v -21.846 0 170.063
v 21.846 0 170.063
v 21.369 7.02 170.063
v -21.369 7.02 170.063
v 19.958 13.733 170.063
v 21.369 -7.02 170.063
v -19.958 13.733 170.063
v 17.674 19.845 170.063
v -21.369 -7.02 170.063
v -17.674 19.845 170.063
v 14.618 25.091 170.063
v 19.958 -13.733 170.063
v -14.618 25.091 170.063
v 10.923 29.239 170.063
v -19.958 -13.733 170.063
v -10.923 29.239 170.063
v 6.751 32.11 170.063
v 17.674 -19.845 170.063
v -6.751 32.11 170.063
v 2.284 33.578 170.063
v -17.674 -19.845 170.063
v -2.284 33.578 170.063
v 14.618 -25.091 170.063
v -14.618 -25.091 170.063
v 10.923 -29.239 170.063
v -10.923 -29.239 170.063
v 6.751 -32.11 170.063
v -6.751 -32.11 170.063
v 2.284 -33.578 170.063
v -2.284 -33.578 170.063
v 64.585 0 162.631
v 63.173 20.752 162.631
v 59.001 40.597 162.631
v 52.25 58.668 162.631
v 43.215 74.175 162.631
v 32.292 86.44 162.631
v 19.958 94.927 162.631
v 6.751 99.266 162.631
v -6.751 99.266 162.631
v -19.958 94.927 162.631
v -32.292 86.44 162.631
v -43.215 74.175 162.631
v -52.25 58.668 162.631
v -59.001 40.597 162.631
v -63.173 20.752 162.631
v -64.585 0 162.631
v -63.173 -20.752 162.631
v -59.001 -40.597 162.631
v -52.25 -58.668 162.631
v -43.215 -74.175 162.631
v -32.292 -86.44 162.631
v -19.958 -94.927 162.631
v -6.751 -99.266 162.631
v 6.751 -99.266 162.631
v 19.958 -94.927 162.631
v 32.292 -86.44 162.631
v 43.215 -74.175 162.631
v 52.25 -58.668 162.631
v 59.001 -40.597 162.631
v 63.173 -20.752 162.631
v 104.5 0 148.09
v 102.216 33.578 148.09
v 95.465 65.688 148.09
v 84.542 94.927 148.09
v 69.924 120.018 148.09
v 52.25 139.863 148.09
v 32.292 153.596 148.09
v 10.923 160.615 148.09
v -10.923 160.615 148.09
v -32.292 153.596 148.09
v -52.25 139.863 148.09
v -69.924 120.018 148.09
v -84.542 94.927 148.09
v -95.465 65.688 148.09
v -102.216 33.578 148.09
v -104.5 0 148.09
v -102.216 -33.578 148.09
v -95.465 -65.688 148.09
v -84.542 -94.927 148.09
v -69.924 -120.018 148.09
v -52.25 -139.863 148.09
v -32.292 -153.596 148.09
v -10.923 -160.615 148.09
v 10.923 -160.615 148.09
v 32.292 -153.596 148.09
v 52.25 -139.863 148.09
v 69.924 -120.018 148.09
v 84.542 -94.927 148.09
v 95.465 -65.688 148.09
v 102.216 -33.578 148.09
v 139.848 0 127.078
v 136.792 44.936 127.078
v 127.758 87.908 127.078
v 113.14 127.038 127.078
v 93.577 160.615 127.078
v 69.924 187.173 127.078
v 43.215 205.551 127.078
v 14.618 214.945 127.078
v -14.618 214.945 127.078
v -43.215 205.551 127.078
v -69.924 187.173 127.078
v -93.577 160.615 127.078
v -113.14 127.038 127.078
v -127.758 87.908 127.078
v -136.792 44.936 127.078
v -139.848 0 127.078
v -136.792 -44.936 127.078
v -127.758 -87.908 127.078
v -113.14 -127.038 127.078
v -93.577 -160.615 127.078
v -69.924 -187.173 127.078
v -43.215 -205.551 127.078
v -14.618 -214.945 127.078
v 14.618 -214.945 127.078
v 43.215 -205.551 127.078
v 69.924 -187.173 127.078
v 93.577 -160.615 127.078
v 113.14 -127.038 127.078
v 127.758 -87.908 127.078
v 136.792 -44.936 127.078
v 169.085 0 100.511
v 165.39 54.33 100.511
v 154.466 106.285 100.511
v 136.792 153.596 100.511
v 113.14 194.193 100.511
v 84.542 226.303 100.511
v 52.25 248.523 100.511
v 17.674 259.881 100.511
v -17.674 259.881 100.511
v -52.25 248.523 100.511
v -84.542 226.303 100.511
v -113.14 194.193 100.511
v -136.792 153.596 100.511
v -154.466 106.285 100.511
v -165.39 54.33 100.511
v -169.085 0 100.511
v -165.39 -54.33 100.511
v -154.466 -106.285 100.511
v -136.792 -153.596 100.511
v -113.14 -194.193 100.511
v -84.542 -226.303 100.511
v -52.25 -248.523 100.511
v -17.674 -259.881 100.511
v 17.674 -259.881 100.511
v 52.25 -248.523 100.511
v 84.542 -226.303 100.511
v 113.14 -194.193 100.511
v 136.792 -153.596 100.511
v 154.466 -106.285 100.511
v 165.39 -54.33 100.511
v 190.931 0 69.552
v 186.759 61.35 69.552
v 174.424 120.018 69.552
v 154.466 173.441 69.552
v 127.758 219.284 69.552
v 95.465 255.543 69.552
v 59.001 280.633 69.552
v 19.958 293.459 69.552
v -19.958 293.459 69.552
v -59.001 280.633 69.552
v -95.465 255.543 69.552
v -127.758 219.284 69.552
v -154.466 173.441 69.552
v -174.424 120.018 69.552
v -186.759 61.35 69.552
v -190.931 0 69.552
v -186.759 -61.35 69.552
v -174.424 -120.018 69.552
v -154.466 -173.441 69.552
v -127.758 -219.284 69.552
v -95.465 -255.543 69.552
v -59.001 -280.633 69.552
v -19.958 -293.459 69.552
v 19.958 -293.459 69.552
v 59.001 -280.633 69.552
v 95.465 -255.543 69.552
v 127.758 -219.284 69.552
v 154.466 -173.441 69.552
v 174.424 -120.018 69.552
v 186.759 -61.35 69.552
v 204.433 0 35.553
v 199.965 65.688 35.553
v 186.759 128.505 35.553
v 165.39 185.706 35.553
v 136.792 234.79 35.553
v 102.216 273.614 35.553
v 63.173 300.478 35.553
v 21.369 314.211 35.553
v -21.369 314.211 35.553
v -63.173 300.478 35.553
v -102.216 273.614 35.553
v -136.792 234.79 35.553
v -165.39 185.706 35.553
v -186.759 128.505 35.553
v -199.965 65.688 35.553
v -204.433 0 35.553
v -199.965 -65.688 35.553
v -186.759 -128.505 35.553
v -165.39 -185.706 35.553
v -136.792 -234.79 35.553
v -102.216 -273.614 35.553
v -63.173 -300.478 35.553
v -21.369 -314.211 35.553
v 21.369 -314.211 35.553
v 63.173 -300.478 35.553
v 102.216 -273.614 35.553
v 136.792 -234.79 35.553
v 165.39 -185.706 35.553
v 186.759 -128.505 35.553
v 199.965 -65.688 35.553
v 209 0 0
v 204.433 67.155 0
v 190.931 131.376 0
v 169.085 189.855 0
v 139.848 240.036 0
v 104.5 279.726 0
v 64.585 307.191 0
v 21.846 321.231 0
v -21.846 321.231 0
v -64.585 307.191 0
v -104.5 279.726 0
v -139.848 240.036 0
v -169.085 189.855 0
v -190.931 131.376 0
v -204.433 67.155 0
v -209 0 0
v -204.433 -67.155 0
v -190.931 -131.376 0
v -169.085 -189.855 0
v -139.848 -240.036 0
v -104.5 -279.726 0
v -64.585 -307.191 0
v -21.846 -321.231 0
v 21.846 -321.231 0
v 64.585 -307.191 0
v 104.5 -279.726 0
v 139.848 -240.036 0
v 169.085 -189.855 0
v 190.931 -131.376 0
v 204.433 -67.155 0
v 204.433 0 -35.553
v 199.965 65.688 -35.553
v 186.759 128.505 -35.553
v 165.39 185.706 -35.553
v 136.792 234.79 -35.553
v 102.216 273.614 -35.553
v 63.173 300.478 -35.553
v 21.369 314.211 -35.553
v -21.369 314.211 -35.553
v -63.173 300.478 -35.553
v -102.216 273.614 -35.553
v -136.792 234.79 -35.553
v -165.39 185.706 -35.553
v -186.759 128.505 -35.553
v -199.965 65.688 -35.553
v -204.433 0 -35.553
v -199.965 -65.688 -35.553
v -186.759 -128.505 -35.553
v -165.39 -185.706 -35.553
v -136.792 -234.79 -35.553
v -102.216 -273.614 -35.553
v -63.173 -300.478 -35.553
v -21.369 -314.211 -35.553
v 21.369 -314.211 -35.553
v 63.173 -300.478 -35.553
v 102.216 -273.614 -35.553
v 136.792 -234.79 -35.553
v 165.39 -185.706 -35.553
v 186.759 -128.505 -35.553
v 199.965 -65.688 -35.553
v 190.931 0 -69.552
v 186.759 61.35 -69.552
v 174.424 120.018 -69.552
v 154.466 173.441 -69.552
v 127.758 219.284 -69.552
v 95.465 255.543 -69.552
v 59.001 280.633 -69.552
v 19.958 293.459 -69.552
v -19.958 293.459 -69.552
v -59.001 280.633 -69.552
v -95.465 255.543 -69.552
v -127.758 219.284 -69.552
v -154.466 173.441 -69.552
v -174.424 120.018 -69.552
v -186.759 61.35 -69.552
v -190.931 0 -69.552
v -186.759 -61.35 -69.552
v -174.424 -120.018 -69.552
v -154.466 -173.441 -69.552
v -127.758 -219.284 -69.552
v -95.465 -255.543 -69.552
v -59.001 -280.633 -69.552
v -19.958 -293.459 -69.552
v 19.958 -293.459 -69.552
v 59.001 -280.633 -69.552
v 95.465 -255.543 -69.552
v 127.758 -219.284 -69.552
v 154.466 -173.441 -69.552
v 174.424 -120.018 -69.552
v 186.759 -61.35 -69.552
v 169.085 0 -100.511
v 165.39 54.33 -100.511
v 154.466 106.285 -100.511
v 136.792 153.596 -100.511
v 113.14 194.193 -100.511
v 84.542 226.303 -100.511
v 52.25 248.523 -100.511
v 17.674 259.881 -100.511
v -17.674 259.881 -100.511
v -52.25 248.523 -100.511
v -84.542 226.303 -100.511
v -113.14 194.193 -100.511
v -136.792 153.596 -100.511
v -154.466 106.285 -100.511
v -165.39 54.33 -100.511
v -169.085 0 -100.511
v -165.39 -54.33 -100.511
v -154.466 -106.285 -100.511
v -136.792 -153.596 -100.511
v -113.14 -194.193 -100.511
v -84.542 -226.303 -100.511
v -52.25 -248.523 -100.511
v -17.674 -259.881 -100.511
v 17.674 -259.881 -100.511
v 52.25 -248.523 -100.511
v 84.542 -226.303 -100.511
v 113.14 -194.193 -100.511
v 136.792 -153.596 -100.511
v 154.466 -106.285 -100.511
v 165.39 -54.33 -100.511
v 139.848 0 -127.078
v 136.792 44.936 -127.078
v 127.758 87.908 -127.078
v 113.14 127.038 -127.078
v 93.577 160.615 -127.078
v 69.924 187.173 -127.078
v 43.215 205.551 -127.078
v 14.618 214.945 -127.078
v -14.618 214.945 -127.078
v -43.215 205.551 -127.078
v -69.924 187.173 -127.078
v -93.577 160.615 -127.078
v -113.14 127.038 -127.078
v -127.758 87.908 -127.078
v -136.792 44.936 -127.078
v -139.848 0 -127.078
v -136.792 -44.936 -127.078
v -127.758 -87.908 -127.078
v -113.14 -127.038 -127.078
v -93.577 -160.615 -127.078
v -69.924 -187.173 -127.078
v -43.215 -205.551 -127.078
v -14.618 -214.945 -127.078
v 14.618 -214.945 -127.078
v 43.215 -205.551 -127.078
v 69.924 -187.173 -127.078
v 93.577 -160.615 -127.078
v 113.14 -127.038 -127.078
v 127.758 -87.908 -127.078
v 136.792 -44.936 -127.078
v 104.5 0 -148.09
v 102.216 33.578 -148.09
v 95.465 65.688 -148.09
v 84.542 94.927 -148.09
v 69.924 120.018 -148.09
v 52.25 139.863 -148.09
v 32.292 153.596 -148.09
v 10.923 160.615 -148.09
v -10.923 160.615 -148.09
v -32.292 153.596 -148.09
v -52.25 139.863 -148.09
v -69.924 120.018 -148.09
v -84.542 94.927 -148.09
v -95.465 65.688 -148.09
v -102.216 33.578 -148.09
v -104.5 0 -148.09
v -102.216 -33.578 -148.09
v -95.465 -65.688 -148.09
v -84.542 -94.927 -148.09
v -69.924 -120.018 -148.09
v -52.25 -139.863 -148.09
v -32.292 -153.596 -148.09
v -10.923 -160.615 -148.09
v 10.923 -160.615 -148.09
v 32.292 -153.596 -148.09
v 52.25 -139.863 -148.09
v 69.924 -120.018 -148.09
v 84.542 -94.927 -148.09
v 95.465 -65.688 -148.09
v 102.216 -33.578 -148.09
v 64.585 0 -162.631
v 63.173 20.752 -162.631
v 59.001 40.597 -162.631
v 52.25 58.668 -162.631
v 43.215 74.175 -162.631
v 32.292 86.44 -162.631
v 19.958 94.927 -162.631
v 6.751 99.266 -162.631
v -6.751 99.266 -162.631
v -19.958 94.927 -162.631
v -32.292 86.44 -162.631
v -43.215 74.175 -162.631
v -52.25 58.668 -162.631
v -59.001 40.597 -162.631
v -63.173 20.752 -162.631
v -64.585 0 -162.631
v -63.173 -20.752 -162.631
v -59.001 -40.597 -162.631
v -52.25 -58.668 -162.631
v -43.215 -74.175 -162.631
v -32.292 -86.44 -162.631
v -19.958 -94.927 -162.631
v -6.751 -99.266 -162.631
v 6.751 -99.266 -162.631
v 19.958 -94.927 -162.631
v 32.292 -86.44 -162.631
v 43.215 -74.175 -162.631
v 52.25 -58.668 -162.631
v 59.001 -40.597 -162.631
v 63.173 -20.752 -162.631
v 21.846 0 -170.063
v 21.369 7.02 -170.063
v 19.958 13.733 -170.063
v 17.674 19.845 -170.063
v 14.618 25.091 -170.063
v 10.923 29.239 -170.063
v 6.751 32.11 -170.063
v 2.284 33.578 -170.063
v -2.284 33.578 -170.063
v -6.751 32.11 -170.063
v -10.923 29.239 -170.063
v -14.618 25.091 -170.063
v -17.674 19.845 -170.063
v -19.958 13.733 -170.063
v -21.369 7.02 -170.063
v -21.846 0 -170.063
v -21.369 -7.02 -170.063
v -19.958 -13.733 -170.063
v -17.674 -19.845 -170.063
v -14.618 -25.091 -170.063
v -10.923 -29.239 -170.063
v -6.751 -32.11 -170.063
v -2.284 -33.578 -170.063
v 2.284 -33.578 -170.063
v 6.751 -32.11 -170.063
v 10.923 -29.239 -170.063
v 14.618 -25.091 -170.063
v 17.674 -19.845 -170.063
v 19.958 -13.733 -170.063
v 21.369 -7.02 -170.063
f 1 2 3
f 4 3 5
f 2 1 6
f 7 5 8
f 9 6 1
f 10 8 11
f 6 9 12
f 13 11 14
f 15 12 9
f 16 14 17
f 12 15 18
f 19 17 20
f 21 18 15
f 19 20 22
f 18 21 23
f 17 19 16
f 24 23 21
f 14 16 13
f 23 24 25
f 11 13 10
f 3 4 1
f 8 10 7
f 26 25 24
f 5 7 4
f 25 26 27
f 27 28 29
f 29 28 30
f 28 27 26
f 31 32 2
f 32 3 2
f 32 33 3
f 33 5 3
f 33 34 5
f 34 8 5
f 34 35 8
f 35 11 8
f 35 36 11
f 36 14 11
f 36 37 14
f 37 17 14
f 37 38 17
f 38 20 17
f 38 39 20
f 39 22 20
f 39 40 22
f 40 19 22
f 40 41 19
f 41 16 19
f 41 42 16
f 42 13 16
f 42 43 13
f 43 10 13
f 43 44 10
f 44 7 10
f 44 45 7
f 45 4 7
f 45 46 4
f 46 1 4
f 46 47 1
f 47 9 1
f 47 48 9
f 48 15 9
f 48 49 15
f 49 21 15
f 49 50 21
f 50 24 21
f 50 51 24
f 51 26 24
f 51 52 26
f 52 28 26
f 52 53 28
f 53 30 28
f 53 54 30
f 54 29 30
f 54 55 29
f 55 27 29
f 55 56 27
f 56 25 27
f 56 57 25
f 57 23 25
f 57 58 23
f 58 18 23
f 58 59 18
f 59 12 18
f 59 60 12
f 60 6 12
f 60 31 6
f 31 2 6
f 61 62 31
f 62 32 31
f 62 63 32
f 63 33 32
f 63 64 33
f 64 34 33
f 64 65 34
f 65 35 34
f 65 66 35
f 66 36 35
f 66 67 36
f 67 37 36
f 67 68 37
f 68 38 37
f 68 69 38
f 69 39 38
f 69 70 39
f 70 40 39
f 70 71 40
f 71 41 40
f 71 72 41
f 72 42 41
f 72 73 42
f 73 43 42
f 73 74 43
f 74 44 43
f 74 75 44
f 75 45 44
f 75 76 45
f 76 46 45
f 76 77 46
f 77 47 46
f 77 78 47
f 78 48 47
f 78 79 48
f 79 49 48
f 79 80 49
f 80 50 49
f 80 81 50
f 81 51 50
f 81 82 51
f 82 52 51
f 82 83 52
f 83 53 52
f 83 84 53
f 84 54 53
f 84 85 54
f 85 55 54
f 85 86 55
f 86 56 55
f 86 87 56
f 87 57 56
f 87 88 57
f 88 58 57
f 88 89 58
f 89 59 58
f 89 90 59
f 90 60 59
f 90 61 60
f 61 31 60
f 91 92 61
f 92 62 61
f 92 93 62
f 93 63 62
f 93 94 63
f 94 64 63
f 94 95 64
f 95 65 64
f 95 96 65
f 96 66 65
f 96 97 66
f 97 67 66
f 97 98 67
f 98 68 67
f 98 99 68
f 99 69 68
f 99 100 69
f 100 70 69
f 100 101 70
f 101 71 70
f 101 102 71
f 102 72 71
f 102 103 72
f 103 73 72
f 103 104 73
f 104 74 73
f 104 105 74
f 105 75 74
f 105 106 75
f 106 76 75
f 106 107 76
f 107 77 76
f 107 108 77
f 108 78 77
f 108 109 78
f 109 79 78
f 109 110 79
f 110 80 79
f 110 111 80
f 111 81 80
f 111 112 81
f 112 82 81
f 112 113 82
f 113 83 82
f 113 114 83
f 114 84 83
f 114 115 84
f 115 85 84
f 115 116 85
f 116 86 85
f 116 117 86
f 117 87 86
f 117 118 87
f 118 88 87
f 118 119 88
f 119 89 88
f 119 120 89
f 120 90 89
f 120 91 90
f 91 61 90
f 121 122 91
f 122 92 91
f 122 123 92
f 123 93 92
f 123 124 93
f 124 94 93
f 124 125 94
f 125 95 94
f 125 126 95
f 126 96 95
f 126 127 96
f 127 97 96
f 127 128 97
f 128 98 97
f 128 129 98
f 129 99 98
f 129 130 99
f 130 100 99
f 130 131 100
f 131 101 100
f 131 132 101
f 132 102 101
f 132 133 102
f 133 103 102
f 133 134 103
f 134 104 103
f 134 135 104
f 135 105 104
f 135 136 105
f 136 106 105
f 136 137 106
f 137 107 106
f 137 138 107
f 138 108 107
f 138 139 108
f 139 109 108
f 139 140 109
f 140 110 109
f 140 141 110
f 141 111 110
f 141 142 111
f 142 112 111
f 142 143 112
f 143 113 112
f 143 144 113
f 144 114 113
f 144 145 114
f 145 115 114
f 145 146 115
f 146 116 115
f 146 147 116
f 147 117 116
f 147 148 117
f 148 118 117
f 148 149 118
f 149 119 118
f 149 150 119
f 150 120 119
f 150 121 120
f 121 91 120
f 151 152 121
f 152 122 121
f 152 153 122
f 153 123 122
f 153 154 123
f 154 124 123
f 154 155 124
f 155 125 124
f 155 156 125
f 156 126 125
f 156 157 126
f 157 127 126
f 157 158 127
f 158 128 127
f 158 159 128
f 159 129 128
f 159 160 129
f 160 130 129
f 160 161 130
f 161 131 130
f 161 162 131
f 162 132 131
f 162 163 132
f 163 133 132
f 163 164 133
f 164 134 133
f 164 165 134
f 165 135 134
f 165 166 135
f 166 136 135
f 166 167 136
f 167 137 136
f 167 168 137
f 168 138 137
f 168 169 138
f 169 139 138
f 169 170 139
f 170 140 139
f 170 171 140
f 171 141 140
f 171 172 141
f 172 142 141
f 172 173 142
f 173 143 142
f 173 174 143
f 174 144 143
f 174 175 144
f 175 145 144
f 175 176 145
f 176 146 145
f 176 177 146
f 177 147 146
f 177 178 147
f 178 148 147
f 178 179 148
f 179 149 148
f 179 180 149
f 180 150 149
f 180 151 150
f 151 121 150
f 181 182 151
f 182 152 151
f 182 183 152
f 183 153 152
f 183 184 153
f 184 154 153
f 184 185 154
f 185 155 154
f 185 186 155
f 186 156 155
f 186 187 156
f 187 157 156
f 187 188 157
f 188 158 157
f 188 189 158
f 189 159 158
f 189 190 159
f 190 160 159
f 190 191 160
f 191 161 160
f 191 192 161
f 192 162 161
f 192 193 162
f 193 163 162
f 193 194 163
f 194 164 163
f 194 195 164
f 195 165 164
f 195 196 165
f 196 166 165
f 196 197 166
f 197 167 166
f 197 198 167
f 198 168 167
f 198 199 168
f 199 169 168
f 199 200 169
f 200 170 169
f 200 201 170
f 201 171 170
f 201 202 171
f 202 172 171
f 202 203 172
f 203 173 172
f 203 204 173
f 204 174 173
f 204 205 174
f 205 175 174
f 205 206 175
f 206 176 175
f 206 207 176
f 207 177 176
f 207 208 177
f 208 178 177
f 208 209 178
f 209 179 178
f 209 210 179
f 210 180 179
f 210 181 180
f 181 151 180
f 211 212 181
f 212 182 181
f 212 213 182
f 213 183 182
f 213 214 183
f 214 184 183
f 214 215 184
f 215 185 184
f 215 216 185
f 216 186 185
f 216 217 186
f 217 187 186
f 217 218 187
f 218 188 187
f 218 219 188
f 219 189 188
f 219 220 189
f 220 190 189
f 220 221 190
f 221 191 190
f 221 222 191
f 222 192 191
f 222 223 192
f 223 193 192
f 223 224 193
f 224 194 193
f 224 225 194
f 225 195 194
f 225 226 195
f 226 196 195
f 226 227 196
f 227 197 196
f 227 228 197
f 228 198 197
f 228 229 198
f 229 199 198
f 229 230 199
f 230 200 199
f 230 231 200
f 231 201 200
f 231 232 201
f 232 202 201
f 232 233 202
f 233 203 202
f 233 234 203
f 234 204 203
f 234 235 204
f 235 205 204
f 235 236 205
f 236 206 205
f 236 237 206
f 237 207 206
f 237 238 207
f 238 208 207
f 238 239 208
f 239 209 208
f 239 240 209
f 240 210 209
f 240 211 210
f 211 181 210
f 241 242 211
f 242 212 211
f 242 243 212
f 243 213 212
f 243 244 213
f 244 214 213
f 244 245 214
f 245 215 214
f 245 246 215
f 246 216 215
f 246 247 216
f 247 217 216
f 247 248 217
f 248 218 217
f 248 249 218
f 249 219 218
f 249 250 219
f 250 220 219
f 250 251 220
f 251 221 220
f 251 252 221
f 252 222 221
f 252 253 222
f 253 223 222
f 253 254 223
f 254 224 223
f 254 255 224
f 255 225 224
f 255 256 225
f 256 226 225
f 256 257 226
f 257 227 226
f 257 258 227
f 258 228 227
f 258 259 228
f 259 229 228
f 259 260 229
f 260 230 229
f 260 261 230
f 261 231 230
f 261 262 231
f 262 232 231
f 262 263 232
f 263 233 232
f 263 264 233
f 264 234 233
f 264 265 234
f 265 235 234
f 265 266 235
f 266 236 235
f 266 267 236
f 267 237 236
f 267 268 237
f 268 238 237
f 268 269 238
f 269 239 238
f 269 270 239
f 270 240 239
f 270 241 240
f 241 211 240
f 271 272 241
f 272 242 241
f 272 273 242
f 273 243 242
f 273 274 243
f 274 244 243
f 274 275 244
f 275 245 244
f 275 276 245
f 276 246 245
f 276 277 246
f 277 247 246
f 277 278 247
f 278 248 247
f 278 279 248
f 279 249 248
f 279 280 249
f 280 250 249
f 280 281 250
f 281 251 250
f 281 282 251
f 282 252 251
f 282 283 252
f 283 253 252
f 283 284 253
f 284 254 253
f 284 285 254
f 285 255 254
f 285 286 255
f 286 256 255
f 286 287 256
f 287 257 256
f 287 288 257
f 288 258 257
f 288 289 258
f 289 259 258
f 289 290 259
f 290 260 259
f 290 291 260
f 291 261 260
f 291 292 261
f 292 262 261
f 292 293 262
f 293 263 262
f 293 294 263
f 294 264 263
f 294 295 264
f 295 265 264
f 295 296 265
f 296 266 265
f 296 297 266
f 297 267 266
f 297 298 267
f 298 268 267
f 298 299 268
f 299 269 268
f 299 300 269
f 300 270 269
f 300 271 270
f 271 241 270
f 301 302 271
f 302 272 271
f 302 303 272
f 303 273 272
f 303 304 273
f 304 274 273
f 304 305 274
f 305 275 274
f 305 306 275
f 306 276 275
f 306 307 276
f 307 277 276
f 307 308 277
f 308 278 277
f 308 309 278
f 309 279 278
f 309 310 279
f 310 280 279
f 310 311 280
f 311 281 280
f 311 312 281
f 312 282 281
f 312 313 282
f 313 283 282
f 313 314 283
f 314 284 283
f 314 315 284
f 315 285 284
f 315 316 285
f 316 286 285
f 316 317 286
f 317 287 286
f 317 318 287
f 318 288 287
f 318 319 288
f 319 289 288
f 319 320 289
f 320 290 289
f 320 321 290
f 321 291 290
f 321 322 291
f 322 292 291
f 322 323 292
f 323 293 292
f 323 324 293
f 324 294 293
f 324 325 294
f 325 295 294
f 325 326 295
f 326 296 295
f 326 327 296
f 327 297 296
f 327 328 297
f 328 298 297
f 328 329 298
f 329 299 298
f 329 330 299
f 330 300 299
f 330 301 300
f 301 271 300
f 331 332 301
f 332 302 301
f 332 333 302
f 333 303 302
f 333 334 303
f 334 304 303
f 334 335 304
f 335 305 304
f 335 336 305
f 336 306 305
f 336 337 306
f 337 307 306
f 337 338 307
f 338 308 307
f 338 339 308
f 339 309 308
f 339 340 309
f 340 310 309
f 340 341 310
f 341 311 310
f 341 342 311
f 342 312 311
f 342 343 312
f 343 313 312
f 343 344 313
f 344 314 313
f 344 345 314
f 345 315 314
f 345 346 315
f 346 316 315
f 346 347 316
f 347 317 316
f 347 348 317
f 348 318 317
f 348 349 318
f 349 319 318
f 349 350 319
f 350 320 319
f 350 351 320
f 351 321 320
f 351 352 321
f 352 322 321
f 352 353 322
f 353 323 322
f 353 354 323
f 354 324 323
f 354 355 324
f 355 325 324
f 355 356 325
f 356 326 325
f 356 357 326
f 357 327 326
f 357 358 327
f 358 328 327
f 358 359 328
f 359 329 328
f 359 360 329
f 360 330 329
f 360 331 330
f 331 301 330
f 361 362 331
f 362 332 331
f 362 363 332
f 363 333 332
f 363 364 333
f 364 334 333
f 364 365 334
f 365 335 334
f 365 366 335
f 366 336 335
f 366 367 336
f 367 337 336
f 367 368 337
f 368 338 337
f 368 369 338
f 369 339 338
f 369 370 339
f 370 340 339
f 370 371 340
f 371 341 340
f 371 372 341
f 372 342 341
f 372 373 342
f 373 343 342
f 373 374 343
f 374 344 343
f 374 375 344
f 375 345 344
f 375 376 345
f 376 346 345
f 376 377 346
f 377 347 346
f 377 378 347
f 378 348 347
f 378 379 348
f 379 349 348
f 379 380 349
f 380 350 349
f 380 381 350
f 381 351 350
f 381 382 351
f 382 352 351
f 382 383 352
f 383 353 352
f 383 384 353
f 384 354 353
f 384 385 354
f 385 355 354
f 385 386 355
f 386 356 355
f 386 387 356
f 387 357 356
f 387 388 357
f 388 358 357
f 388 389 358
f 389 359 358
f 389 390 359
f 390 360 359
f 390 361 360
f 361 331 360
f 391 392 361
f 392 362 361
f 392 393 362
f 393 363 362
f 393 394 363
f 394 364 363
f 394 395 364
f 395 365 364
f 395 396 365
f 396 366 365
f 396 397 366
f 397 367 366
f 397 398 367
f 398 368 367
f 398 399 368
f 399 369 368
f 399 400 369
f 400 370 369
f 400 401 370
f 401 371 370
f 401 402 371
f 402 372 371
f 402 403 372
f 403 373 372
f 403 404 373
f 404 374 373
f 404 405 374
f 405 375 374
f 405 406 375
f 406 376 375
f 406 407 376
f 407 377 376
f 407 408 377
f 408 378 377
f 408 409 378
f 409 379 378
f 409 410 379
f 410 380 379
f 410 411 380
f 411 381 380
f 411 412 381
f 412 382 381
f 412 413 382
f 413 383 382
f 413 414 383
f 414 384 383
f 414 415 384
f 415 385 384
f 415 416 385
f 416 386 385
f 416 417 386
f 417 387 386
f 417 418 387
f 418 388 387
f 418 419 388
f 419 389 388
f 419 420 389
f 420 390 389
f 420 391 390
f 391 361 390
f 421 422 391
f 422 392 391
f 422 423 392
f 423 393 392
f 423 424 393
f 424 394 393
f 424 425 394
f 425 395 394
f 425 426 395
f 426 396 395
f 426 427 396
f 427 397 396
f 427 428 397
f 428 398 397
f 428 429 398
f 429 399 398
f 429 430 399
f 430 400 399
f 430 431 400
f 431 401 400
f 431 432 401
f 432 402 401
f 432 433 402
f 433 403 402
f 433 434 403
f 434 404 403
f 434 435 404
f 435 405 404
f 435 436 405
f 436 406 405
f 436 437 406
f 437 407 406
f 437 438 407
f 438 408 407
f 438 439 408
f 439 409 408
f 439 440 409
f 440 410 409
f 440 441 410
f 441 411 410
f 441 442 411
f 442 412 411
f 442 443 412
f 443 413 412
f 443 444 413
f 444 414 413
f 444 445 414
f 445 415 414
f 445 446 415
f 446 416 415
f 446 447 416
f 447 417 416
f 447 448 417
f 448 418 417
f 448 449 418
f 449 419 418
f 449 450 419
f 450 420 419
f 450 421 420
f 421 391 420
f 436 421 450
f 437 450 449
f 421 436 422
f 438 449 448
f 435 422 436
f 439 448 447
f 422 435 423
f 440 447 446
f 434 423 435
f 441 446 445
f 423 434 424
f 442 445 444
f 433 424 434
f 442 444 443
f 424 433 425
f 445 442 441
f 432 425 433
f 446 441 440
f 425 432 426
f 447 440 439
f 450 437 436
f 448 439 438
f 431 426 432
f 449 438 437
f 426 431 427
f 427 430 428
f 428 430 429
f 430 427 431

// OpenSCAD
// Generated by SolidPython 1.0.1 on 2020-07-29 00:46:50


scale(v = [11, 17, 9]) {
	sphere(r = 19);
}
/***********************************************
*********      SolidPython code:      **********
************************************************
 
# import packages: SolidPython
from solid import *
from solid.utils import *
from itertools import chain, combinations, permutations


class Resize:

    def __init__(self, scad_file):
        self.scad_file = scad_file
        #self.scad_file = import_scad(scad_file)
        # cone/cylinder param:
        self.r1 = 0
        self.r2 = 0
        self.h = 0
        # rectangular prism param:
        self.w = 0
        self.l = 0
        # ellipse param:
        self.r = 0

    # import OpenScad code (file name corresponds to shape)


    # classify shape + parameters
    def assign(self, param1, param2, param3):
        if self.scad_file == 'cone.scad':
            self.r1 = param1
            self.r2 = param2
            self.h = param3
        elif self.scad_file == 'cylinder.scad':
            self.r1 = param1
            self.r2 = param2
            self.h = param3
        elif self.scad_file == 'rectangularPrism.scad':
            self.h = param1
            self.l = param2
            self.w = param3
        else:
            self.r = param1
            self.h = param2

    # resize parameters
    def iterate(self):
        x = range(3, 20, 2)
        i = 1
        if self.scad_file == 'cone.scad':
            tempList = list(permutations(x, 2))
            for temp in tempList:
                param1 = temp[0]
                param2 = temp[1]
                filepath = 'produced_scad_files/' + 'cone' + str(param1) + '_' + str(param2) + '_' + '.scad'
                scad_render_to_file(cylinder(h=param1, r1=param2, r2=0), filepath)

        elif self.scad_file == 'cylinder.scad':
            tempList = list(permutations(x, 3))
            for temp in tempList:
                param1 = temp[0]
                param2 = temp[1]
                filepath = 'produced_scad_files/' + 'cylinder' + str(param1) + '_' + str(param2) + '_' + '.scad'
                scad_render_to_file(cylinder(h=param1, r1=param2, r2=param2), filepath)

        elif self.scad_file == 'rectangularPrism.scad':
            tempList = list(permutations(x, 3))
            for temp in tempList:
                param1 = temp[0]
                param2 = temp[1]
                param3 = temp[2]
                filepath = 'produced_scad_files/' + 'rectangularPrism' + str(param1) + '_' + str(param2) + '_' + str(
                    param3) + '.scad'
                scad_render_to_file(cube(size=(param1, param2, param3)), filepath)

        elif self.scad_file == 'ellipse.scad':
            tempList = list(permutations(x, 4))
            for temp in tempList:
                param1 = temp[0]
                param2 = temp[1]
                param3 = temp[2]
                param4 = temp[3]
                filepath = 'produced_scad_files/' + 'ellipse' + str(param1) + '_' + str(param2) + '_' + str(param3) + '_' + str(param4) + '.scad'
                scad_render_to_file(scale([param1, param2, param3])(sphere(r=param4)), filepath)

    def render_to_scadfile(self):
        scad_render_to_file(scad, 'example.scad') 
 
************************************************/
